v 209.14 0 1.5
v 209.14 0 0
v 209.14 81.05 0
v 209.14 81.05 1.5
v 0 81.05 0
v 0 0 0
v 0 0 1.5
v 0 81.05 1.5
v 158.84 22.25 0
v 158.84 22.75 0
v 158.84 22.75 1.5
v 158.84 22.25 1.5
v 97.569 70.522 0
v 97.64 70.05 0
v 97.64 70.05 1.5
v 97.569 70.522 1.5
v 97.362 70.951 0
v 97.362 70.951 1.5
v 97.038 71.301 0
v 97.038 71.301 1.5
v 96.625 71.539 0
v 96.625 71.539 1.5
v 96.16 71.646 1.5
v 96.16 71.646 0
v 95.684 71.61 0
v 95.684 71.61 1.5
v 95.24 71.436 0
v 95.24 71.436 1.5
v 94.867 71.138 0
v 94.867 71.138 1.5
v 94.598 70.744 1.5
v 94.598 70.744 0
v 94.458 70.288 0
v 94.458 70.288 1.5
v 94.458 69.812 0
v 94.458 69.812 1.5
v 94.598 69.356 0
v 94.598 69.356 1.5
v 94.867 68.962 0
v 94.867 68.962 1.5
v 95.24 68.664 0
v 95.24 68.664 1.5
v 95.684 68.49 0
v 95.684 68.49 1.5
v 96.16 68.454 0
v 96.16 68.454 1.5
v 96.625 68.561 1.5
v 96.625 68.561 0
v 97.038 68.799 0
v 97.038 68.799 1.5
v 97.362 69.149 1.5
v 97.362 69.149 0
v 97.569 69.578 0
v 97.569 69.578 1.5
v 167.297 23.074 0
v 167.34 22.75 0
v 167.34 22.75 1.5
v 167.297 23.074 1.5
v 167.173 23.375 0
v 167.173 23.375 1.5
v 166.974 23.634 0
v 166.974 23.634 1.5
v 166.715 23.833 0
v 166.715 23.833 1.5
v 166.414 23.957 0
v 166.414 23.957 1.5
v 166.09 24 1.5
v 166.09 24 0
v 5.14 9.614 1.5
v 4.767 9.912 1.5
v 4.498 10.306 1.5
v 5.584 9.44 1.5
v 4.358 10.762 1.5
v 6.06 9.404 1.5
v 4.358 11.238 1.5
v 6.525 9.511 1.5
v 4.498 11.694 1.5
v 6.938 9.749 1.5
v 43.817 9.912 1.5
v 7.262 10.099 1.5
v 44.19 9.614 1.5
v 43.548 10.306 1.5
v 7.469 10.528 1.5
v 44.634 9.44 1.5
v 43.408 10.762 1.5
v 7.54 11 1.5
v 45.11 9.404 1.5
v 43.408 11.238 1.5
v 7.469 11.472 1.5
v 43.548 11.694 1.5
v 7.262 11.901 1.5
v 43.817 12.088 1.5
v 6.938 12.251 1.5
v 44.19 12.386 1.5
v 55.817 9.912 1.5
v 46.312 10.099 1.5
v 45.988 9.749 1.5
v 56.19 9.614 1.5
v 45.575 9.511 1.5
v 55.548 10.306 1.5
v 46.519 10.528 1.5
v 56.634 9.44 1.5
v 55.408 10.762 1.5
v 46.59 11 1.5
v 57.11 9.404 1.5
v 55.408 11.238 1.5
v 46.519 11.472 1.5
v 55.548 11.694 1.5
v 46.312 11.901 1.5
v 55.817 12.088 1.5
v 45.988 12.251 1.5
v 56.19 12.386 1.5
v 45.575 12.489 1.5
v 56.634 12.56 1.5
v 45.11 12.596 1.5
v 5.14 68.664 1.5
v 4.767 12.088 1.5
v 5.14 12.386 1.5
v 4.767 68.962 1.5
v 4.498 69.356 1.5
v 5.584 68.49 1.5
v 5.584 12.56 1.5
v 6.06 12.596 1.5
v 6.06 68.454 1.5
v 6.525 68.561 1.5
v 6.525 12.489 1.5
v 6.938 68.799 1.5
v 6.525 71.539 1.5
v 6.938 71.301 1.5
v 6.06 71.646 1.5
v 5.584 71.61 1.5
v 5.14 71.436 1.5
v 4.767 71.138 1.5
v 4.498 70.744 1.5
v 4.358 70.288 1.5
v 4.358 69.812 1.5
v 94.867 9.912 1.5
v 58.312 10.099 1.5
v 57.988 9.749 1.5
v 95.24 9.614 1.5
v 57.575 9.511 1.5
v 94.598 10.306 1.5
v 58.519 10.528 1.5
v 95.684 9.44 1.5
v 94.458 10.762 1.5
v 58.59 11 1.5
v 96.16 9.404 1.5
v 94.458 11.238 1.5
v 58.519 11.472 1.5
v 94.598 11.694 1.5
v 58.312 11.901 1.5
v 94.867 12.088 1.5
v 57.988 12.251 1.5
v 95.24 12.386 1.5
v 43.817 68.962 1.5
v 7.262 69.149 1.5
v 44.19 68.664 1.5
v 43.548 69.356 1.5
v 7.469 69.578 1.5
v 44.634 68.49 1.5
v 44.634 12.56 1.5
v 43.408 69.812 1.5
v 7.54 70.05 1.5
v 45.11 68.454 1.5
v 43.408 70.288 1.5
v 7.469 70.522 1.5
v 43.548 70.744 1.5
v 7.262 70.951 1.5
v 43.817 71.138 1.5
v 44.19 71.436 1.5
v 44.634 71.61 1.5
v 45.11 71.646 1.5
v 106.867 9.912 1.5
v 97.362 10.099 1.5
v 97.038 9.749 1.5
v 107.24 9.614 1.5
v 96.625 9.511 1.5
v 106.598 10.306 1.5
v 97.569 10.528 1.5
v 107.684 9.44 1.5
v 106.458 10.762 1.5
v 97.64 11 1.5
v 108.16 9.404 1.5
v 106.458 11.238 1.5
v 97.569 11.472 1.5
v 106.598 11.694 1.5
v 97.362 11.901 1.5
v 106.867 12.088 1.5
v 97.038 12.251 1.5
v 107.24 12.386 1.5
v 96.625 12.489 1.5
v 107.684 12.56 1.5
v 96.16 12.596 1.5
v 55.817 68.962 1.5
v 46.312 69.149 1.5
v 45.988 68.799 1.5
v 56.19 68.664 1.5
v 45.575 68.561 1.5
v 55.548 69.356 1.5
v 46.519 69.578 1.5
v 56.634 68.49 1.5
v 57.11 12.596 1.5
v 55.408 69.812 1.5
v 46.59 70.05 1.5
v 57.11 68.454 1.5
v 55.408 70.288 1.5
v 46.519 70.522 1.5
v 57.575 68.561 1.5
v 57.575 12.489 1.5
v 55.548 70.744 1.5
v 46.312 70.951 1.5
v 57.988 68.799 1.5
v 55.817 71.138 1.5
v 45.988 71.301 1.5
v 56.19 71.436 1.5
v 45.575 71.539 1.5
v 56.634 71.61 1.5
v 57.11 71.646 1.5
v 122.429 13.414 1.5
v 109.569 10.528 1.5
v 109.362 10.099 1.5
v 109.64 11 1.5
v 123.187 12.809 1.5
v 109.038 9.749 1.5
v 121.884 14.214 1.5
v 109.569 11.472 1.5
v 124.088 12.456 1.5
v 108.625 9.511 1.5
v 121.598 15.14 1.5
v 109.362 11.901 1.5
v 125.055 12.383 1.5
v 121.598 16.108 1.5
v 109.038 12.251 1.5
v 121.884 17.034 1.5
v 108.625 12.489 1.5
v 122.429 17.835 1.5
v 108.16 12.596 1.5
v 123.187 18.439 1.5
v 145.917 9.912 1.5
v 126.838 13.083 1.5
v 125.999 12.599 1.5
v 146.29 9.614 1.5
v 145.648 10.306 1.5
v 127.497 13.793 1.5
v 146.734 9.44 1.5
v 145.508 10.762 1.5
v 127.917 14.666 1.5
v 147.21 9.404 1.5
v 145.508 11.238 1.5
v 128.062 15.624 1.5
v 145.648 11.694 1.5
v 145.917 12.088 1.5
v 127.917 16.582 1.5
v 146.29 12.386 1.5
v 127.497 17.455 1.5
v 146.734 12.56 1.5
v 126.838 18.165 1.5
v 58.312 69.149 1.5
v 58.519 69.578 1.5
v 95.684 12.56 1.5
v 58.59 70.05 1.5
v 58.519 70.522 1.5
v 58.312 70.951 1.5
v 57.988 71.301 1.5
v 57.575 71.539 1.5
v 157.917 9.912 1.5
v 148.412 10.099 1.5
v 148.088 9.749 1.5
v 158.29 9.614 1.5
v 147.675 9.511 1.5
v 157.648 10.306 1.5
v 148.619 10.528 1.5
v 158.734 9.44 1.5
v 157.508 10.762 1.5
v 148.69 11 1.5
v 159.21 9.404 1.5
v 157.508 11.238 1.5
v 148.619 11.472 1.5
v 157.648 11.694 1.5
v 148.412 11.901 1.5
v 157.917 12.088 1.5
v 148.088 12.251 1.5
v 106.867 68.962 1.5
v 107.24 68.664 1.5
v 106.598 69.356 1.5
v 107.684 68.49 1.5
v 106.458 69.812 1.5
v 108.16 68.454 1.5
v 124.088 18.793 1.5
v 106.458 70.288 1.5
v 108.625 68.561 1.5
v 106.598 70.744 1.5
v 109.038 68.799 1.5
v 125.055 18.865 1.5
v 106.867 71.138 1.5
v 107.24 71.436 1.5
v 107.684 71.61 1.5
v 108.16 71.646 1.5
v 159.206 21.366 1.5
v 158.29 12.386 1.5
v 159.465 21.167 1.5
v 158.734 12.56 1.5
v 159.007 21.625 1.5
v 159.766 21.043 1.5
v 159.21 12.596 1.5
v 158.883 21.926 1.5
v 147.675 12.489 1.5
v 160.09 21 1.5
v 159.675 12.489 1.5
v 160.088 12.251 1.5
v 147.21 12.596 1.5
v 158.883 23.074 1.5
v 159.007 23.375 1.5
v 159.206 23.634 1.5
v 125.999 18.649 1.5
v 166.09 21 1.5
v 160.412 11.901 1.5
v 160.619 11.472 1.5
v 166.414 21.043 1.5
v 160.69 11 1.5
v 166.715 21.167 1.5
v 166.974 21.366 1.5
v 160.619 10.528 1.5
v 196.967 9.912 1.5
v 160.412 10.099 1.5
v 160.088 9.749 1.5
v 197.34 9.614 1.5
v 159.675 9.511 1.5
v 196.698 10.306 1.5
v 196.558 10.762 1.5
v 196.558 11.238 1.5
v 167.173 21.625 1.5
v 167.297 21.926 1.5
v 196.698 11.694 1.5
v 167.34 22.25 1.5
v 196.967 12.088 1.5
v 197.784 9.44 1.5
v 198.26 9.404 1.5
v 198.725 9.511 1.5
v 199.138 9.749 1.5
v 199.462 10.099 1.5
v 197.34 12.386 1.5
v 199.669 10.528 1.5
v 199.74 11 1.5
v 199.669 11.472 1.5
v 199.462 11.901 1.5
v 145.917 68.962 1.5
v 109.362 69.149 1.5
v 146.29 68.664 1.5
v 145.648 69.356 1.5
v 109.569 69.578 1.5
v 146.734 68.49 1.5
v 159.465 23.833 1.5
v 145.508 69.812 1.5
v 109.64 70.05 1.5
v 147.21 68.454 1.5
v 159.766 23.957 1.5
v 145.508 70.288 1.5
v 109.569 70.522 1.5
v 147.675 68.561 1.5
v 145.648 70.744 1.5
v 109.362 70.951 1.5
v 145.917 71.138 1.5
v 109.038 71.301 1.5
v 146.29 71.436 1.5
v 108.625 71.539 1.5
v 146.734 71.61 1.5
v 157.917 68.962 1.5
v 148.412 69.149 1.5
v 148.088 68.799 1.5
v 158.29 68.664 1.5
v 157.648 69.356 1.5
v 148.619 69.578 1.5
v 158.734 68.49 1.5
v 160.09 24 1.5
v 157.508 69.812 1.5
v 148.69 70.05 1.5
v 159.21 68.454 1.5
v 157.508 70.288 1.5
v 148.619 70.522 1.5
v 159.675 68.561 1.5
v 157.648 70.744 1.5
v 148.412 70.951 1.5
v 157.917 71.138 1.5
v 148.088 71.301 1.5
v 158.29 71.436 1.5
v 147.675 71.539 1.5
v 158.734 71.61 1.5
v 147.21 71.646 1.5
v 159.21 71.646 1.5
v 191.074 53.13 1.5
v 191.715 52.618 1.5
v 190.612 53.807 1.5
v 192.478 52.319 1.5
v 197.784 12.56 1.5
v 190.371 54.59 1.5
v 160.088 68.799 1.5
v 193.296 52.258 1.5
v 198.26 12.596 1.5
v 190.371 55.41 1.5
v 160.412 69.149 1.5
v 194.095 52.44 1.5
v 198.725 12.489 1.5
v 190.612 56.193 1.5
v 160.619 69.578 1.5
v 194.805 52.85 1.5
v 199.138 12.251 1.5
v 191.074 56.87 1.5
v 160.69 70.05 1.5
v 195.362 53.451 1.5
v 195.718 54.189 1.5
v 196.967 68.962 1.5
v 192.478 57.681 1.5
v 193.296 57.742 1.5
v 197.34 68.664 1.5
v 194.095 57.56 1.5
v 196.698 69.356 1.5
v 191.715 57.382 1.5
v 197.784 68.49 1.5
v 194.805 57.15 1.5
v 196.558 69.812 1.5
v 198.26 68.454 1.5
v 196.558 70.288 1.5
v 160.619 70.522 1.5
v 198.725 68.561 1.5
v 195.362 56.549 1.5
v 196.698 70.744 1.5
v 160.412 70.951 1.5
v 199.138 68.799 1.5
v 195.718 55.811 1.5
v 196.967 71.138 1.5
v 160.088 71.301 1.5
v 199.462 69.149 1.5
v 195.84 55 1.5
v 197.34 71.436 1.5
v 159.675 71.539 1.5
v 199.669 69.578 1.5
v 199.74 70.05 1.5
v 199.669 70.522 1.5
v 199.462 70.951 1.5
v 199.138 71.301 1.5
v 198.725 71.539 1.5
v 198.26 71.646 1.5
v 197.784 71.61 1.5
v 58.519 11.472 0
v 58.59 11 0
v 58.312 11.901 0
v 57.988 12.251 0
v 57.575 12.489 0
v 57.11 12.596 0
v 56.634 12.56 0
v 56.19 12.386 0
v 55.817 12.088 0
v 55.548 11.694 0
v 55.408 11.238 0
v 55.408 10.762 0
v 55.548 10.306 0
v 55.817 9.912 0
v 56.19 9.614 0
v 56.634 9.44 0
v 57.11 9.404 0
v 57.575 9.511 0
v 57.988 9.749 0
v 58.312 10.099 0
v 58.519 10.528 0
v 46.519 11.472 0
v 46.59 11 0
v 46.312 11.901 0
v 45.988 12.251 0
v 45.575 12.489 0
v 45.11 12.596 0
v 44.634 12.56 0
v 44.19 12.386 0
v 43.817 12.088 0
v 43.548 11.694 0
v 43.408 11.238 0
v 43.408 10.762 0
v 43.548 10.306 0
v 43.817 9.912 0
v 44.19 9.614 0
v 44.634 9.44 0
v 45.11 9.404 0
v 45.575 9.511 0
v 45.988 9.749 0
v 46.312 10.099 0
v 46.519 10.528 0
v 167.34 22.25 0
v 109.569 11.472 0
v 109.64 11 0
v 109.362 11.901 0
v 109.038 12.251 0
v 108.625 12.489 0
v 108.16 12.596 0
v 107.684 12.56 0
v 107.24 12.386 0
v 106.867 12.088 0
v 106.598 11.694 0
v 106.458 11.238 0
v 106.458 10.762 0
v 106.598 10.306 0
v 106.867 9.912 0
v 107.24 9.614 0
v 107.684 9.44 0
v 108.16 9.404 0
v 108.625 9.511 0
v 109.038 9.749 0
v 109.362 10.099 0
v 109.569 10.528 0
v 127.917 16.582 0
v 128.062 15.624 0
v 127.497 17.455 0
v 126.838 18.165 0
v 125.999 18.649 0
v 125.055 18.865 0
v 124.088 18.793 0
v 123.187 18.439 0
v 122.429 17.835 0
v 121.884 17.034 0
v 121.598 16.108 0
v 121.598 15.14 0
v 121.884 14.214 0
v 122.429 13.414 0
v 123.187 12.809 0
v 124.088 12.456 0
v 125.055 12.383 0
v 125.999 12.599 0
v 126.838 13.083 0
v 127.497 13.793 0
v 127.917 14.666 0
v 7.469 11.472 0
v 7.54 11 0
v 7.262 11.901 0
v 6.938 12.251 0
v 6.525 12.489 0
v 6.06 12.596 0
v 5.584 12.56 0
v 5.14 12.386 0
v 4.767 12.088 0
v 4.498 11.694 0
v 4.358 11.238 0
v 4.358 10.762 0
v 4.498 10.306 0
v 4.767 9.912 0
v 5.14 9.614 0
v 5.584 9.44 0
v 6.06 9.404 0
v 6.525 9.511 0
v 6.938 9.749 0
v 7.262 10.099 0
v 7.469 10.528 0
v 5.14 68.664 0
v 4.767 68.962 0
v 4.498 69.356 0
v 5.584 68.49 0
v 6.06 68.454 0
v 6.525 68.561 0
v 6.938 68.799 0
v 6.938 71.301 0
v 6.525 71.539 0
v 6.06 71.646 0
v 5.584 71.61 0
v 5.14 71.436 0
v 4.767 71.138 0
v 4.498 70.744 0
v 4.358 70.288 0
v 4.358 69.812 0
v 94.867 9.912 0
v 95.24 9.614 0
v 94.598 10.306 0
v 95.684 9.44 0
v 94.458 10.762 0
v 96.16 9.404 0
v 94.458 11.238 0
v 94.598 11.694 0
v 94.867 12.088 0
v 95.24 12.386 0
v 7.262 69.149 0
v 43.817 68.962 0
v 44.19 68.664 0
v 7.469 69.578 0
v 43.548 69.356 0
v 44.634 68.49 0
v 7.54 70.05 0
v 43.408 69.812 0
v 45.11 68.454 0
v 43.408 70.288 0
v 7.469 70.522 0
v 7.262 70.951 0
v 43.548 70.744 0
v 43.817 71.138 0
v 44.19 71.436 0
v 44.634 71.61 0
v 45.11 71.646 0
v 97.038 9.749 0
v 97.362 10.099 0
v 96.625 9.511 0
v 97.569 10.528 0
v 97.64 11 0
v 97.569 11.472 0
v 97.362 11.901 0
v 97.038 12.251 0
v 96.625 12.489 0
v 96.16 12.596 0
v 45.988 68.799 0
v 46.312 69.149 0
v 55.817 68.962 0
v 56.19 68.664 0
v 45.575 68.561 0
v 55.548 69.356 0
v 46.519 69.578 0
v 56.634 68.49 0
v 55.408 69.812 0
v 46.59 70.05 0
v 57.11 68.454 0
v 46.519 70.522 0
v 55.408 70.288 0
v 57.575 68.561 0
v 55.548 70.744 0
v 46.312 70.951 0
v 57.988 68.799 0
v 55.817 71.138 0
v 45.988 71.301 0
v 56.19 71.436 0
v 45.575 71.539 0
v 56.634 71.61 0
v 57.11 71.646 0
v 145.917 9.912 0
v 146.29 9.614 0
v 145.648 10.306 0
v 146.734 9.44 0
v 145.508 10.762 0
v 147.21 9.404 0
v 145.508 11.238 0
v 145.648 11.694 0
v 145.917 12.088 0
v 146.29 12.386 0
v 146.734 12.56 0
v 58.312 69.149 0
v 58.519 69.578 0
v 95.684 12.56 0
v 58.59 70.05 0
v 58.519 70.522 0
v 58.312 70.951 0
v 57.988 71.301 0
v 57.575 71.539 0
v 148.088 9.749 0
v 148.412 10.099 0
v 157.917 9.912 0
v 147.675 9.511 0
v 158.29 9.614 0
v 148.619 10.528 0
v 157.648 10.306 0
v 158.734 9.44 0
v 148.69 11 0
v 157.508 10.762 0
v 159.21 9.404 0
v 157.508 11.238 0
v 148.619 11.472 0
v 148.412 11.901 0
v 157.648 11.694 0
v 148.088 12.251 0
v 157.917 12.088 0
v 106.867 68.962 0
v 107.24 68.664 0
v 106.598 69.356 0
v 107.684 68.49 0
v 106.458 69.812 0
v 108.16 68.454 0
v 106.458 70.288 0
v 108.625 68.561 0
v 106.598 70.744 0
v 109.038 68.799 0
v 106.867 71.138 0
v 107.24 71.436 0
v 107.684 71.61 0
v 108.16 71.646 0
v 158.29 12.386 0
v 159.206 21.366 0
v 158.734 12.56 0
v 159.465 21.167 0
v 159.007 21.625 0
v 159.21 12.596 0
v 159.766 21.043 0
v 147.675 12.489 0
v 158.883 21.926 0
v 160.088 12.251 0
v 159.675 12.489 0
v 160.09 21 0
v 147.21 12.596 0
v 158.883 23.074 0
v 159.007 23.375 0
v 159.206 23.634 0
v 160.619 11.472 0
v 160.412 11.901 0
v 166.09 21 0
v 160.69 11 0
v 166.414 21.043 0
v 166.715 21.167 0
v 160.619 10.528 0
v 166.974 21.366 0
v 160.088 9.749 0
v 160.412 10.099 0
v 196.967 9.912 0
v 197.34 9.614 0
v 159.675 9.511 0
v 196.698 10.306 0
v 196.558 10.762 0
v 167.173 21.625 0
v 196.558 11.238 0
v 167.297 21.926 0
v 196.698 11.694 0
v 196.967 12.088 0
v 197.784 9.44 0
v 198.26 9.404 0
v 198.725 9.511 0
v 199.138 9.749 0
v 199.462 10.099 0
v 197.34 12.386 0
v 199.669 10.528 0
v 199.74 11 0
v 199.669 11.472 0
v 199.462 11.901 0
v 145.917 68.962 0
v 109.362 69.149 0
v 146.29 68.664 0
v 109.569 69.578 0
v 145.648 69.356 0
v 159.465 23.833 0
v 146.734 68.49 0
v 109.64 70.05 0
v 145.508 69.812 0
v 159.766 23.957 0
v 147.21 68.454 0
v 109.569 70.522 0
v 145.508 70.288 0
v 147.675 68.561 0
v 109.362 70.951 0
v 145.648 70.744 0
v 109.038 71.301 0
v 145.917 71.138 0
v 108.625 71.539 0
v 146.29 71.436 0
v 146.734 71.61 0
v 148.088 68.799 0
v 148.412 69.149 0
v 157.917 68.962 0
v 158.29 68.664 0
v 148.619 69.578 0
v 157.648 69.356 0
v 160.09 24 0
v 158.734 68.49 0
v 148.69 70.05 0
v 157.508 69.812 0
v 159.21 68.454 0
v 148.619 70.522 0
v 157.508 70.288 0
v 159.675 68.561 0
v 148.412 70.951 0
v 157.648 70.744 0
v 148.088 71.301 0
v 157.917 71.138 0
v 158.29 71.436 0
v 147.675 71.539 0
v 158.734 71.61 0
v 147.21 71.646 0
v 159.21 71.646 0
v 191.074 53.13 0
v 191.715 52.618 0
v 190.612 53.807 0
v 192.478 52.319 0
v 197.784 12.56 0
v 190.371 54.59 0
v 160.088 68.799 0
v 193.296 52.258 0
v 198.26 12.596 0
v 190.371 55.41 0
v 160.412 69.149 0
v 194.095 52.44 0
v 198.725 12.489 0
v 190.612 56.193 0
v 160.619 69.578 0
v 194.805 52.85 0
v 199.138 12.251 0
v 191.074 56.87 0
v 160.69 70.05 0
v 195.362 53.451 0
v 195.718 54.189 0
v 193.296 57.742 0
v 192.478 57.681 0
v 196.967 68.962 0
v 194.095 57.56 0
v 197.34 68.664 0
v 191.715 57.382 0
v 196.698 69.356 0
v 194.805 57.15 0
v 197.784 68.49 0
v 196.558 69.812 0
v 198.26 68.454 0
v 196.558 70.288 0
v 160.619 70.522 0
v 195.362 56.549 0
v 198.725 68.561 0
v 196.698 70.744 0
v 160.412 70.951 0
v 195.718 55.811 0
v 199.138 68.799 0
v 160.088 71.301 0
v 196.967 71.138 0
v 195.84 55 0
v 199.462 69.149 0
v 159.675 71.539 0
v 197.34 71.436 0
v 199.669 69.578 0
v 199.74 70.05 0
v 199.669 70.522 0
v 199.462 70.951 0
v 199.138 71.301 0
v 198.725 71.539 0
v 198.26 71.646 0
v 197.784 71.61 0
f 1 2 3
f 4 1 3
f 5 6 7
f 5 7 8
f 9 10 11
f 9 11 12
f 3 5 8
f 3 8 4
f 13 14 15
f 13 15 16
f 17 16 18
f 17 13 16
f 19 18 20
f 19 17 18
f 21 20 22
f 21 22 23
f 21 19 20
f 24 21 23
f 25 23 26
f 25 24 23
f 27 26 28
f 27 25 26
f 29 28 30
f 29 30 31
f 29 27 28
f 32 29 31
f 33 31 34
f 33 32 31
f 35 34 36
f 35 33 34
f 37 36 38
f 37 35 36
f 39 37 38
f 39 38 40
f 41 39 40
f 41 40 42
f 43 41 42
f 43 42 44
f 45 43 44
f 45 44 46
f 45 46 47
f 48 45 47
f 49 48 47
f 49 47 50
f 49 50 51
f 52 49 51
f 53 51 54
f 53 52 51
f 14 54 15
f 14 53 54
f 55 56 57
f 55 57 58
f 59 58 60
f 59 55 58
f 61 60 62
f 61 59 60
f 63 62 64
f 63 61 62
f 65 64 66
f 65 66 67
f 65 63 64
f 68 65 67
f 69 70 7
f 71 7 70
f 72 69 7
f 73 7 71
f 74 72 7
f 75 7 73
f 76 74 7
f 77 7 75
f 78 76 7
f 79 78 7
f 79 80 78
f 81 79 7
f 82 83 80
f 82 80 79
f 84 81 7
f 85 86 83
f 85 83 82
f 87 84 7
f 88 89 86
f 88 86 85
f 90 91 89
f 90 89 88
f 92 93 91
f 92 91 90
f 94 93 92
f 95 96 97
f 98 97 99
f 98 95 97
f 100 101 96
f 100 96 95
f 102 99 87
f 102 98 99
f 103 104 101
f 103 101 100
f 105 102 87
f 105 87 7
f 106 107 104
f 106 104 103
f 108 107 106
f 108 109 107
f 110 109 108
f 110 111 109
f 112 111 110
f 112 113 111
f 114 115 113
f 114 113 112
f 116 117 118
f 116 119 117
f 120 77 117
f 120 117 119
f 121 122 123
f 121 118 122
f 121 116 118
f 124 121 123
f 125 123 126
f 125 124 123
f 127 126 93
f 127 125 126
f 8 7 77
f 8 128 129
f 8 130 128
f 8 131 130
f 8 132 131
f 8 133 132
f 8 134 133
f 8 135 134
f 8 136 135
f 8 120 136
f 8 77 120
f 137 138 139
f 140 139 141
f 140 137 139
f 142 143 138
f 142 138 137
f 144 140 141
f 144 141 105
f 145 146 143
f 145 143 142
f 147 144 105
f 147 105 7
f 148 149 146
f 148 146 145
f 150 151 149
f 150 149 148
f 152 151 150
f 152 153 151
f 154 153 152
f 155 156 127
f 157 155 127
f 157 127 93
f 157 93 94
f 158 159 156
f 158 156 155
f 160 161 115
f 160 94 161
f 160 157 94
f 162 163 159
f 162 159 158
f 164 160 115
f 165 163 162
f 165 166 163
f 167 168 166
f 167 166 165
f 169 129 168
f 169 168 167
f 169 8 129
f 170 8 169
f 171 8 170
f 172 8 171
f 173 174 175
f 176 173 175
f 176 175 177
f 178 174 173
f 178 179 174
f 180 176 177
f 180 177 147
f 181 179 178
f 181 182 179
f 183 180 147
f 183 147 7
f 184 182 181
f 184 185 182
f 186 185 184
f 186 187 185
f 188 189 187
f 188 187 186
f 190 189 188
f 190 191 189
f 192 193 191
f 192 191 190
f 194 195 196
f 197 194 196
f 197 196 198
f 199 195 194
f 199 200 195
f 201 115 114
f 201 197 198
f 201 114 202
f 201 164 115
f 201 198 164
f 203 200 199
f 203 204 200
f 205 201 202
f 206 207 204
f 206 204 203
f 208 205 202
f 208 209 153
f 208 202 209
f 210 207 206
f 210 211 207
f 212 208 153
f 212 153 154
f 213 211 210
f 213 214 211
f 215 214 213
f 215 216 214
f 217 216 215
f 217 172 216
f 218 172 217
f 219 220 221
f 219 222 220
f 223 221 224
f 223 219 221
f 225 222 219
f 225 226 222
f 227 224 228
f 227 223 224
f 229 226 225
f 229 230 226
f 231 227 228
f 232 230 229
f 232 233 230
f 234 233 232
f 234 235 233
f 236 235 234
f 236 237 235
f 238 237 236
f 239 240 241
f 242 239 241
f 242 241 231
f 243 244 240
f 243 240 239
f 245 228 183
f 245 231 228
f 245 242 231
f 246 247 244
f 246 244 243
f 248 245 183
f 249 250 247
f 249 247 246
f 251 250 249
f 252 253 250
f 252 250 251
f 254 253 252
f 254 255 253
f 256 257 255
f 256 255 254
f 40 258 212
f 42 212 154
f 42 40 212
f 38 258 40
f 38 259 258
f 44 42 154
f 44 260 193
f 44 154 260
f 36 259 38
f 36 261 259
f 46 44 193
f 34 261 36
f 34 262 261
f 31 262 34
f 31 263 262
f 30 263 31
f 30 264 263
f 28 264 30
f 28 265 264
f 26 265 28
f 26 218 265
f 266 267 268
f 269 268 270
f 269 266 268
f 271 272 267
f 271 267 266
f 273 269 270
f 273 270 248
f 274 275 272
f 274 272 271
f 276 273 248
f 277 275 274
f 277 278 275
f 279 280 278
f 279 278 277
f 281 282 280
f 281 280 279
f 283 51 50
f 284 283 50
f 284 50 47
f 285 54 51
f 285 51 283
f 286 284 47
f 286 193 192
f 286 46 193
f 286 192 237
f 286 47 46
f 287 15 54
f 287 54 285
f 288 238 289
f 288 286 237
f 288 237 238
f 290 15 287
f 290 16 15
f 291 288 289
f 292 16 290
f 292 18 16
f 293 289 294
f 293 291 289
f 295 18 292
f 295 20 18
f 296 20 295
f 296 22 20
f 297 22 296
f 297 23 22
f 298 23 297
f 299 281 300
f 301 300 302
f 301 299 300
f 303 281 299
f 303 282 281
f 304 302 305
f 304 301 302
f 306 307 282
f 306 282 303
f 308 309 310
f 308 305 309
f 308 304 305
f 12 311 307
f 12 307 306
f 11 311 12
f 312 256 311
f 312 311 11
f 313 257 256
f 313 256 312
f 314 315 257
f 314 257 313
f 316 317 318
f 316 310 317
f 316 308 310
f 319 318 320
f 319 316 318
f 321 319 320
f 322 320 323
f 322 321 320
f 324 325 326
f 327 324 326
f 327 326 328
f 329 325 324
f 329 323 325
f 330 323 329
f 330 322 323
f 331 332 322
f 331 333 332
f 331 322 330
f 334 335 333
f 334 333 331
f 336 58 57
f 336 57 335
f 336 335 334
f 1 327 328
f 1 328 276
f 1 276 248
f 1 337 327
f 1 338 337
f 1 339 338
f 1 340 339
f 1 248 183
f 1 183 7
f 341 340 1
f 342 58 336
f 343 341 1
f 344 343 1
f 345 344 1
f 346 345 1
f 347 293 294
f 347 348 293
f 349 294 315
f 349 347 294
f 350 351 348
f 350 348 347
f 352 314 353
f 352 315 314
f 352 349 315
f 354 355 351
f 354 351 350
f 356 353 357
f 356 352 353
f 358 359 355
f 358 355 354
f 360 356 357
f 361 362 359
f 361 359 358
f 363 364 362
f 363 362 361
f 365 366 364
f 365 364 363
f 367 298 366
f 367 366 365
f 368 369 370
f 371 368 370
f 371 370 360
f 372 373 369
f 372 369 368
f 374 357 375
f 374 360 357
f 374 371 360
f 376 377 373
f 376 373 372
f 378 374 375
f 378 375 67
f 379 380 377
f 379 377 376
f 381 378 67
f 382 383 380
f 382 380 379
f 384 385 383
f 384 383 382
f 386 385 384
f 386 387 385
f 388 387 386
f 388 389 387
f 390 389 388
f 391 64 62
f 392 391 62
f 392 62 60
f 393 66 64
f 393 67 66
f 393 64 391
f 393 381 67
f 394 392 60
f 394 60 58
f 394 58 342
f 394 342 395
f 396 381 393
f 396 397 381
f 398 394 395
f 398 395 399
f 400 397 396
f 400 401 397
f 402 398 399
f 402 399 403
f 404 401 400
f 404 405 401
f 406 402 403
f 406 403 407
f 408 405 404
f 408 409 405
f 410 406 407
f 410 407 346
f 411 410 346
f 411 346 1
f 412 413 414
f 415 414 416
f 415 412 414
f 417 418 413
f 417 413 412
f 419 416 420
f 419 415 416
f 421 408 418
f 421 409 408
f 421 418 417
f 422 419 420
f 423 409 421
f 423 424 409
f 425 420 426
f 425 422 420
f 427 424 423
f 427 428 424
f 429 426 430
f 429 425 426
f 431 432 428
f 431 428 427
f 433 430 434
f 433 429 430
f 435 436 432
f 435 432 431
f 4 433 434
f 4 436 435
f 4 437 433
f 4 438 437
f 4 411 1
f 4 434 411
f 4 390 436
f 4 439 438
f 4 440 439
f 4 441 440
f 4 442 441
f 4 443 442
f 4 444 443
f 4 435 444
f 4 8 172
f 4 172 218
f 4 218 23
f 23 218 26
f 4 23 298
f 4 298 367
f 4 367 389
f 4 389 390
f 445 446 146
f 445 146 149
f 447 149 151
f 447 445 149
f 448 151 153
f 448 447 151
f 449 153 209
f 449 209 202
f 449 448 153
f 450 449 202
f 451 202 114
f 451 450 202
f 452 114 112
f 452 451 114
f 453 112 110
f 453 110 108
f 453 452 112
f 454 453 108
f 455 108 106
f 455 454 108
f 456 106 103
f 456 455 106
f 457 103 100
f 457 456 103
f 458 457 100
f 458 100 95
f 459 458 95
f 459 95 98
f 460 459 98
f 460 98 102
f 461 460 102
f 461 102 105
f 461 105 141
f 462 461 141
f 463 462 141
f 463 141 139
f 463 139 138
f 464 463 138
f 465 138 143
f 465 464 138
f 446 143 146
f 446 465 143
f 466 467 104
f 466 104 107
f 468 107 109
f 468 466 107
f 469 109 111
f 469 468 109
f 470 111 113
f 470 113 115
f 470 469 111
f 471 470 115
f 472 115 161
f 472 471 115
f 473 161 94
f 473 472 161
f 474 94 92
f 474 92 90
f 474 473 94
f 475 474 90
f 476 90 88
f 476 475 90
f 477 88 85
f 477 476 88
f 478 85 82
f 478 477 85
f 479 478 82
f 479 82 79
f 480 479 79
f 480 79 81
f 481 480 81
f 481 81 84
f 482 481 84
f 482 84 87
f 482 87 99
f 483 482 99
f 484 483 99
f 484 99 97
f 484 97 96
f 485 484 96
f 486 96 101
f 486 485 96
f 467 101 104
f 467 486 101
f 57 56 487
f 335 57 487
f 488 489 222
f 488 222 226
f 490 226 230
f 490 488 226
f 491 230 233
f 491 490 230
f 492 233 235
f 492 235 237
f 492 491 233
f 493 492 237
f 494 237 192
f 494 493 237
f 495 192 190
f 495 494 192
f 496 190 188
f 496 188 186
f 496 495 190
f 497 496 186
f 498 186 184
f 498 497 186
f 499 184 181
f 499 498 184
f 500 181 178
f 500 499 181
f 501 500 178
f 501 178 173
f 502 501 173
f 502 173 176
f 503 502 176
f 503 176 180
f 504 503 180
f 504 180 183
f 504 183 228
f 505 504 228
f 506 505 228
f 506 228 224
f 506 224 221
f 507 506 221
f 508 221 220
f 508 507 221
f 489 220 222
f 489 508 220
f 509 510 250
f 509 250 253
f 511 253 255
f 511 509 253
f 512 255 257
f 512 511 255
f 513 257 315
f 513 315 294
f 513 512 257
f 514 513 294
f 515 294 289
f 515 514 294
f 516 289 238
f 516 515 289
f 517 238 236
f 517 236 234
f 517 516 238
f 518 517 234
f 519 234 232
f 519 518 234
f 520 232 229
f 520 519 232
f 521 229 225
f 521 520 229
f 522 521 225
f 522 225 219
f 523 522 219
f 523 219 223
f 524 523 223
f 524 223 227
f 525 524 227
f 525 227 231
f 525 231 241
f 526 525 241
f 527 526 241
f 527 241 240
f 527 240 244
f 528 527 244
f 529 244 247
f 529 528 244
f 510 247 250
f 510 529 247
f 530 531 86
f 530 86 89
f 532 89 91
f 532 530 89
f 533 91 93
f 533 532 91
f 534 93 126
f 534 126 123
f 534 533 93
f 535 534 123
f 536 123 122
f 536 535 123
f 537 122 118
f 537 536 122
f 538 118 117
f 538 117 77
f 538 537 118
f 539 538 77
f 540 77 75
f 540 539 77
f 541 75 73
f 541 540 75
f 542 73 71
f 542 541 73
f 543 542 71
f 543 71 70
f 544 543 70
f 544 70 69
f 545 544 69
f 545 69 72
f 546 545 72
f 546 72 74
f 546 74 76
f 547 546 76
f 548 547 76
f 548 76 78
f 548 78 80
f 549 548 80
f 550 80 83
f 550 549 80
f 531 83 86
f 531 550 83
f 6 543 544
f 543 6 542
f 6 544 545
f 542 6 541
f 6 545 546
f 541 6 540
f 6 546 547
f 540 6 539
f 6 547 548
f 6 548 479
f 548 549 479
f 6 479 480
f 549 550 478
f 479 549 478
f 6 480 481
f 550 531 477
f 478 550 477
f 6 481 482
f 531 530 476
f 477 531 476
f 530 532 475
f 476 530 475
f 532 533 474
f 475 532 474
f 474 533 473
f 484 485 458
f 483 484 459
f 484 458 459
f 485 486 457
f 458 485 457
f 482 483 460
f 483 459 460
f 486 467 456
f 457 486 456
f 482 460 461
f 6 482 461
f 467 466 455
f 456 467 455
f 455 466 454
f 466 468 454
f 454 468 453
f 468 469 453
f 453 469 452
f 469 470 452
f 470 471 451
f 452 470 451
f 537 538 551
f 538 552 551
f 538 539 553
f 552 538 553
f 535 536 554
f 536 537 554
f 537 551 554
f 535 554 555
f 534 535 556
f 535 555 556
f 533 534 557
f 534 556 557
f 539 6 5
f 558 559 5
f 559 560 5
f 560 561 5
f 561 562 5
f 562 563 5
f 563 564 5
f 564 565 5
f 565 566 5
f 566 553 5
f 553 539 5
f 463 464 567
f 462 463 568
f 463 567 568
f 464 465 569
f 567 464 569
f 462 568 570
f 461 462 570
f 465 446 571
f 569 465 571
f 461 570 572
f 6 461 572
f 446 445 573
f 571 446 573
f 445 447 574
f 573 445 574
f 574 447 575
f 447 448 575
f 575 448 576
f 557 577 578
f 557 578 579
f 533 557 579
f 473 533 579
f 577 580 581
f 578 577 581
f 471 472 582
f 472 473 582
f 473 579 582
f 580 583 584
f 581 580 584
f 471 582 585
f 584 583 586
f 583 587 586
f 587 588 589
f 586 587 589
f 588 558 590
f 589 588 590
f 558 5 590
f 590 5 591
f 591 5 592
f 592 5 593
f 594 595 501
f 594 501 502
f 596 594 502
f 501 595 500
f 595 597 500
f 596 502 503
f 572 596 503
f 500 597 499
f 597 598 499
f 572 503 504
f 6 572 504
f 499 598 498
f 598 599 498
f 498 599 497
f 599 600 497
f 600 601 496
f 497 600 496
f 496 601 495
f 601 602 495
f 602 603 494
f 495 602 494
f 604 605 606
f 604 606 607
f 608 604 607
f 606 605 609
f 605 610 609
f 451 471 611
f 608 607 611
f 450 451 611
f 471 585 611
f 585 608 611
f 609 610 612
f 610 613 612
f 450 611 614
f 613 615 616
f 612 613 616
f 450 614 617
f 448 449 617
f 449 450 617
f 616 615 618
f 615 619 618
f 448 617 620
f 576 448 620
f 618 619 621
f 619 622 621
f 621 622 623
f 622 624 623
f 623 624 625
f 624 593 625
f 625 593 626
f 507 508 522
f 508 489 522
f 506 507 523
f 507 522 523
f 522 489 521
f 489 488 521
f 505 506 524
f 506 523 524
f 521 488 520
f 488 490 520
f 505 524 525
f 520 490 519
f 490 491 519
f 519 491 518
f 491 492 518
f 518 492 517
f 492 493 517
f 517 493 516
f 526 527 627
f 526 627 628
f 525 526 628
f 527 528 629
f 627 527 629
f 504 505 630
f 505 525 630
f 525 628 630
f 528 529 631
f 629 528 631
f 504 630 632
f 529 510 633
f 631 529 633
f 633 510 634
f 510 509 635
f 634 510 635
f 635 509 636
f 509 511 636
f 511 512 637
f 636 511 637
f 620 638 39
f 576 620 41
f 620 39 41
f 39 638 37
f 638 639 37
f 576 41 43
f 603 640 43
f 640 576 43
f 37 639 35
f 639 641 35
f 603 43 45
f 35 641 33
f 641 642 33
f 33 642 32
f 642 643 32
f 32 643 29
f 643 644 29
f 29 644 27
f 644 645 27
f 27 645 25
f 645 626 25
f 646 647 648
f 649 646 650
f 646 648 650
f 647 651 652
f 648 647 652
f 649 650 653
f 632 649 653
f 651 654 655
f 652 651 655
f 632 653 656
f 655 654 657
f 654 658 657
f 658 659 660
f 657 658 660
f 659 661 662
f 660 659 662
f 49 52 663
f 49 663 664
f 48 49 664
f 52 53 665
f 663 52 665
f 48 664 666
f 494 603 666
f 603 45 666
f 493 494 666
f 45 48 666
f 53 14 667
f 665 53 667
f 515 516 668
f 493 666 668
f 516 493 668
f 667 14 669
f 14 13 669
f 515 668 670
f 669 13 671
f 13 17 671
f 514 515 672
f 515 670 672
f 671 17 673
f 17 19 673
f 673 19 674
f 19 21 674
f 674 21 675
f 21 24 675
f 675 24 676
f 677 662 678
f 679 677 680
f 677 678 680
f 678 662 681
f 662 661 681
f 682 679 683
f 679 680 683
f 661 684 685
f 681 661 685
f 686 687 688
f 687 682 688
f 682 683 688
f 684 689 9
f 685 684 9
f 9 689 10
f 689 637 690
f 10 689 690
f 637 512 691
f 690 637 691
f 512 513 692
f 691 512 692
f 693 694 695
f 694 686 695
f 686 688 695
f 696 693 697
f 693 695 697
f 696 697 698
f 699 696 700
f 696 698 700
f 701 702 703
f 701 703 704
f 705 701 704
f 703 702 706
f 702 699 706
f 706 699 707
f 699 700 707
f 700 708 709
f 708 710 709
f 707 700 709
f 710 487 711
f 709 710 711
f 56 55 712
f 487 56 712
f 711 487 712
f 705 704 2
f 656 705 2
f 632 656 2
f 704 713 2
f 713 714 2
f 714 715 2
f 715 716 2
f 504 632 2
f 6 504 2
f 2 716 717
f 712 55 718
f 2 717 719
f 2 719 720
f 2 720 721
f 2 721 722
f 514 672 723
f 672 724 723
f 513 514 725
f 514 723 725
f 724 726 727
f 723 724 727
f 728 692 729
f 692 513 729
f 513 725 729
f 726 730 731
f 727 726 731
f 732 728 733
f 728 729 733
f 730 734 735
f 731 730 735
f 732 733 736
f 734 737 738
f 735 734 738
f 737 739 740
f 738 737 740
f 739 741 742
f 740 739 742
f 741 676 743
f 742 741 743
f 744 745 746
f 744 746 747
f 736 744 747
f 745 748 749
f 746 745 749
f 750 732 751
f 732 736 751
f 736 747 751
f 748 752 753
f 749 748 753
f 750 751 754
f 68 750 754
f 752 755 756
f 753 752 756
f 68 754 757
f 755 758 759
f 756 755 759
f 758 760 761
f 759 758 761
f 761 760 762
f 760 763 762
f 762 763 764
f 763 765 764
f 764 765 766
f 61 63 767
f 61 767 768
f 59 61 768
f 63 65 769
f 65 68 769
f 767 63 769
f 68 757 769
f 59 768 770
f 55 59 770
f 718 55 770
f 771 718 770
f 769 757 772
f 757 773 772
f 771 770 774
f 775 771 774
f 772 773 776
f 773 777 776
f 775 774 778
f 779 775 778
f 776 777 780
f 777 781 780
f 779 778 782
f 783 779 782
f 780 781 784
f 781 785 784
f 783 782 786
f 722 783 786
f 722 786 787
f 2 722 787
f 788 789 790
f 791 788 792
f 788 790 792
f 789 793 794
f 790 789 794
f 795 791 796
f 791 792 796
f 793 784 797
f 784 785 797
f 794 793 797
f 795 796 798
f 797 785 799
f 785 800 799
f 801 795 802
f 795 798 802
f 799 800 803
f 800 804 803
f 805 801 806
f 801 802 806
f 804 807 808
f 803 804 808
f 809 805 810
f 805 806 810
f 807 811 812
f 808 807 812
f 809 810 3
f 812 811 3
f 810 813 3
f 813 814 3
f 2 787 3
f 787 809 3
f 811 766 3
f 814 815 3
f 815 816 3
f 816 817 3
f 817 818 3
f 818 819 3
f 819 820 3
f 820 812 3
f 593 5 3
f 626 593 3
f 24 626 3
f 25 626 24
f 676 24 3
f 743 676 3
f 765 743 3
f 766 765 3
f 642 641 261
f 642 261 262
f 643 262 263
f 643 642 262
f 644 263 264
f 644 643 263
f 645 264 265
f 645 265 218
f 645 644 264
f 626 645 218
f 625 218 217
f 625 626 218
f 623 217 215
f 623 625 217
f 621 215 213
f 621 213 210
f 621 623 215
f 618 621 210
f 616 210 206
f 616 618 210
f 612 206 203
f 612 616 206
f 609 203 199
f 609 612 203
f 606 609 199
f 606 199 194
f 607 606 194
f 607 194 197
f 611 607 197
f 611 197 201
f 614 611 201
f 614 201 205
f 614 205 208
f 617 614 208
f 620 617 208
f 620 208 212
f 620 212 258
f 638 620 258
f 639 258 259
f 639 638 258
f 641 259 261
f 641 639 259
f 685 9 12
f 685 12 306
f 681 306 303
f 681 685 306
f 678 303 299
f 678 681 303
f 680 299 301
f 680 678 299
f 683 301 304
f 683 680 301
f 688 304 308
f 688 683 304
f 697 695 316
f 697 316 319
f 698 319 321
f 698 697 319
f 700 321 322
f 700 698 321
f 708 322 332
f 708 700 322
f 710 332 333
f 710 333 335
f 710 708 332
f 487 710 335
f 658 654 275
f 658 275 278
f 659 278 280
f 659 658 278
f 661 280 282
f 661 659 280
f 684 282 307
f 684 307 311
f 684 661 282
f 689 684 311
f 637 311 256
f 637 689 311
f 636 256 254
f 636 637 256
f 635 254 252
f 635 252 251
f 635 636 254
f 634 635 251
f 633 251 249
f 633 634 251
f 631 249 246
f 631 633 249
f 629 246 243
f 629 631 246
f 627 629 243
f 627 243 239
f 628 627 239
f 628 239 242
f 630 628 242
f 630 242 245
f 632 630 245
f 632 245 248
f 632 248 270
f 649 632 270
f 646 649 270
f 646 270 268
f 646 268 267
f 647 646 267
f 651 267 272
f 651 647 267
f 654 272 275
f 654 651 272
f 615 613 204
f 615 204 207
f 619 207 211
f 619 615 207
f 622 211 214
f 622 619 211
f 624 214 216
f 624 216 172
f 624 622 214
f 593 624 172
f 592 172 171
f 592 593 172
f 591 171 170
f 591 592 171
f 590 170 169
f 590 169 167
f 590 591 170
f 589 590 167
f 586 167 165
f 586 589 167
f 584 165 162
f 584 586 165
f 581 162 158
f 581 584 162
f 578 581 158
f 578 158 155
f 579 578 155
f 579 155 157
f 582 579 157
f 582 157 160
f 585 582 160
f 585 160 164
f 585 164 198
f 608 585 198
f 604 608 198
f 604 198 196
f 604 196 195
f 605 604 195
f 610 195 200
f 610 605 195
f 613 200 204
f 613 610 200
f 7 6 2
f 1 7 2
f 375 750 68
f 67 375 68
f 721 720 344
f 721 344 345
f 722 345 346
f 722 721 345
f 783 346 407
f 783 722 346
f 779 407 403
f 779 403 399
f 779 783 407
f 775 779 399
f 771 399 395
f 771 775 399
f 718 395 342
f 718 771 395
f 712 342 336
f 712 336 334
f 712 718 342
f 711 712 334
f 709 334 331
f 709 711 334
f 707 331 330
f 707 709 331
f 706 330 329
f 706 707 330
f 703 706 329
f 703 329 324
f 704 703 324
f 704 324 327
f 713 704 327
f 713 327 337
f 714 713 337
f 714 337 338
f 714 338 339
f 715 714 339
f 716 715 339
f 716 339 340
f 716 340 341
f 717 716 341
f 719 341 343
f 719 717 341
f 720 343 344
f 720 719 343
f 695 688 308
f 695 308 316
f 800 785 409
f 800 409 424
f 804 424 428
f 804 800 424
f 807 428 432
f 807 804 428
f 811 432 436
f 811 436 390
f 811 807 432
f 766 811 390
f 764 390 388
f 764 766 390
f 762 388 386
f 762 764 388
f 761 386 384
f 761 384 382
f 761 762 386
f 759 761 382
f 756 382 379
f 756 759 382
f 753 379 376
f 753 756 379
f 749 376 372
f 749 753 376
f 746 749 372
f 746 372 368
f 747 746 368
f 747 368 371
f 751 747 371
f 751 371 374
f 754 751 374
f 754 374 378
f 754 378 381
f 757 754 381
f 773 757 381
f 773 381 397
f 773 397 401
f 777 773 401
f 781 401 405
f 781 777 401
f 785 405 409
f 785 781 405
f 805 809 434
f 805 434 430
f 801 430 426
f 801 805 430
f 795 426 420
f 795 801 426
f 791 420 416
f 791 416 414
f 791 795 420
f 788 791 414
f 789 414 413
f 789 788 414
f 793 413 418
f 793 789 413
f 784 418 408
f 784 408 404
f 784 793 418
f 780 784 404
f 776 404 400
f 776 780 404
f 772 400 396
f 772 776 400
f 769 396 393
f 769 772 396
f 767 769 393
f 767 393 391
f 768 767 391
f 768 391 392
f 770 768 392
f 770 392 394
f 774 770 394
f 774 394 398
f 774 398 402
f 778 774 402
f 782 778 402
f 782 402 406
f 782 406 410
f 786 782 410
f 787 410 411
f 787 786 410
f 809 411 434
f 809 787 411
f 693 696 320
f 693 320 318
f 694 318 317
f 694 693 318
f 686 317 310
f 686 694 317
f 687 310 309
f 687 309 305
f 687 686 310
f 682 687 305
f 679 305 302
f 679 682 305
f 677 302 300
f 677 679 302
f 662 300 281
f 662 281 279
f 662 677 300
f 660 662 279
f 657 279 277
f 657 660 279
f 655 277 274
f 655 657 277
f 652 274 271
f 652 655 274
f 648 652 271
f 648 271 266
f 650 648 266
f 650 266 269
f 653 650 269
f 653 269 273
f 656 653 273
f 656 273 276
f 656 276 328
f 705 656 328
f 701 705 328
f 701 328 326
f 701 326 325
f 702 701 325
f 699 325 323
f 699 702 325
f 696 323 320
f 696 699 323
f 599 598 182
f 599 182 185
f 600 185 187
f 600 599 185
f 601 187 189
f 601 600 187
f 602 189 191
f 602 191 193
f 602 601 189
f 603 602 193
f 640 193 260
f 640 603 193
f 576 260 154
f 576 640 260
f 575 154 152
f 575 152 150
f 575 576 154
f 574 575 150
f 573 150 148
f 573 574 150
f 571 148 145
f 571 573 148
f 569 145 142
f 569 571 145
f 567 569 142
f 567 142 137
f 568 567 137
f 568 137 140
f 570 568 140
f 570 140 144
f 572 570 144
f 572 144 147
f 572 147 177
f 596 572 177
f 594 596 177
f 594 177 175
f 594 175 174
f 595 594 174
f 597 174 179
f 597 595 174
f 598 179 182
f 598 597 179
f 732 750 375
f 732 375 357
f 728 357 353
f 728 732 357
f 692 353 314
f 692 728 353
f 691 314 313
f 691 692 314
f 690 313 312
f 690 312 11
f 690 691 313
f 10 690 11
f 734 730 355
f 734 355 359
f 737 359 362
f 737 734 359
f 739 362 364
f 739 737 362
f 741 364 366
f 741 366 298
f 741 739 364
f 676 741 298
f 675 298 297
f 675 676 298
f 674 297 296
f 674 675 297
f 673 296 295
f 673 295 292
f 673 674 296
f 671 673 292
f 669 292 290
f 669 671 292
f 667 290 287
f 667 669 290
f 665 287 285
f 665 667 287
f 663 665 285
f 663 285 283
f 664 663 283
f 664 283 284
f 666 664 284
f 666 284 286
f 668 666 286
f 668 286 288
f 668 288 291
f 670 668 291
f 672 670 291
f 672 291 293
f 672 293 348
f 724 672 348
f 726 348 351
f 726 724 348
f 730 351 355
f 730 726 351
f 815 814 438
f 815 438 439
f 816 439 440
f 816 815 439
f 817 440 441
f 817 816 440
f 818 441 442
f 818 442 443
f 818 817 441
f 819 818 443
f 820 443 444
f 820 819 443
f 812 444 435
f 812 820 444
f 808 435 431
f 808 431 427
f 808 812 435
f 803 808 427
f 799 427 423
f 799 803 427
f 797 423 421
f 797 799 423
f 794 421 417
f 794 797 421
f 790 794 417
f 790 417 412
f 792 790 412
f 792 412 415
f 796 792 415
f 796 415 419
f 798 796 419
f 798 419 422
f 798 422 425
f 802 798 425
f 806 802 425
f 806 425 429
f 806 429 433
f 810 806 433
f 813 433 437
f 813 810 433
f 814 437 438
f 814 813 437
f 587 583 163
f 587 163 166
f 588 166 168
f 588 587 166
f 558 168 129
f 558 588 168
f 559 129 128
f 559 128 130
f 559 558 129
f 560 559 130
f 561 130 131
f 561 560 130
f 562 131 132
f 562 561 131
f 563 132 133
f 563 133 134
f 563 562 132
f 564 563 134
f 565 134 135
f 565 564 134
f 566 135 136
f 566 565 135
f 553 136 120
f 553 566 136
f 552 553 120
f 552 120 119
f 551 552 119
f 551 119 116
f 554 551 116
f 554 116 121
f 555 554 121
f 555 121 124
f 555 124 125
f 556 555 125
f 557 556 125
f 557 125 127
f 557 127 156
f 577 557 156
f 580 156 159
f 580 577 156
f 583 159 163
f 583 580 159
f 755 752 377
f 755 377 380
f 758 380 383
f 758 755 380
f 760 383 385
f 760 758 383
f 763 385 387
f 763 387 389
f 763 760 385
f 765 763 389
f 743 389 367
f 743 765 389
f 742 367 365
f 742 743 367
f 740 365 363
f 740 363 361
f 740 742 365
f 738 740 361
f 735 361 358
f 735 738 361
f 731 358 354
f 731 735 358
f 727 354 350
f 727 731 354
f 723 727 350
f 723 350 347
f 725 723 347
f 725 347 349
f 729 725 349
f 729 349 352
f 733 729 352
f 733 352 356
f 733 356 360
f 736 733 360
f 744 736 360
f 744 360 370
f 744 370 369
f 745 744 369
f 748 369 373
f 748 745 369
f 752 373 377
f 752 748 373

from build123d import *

# Parameters (mm, degrees)
SKETCH_W   = 209.14
SKETCH_H   = 81.05
SKETCH_R   = 1.6
SKETCH_R_2 = 2.75
SKETCH_R_3 = 3.25
PAD_DEPTH  = 1.5


with BuildPart() as part:
    # Sketch → Pad (new body)
    with BuildSketch(Plane.XY):
        with Locations((104.57, 40.525)):
            Rectangle(SKETCH_W, SKETCH_H)
        with Locations((5.94, 70.05)):
            Circle(SKETCH_R, mode=Mode.SUBTRACT)
        with Locations((44.99, 70.05)):
            Circle(SKETCH_R, mode=Mode.SUBTRACT)
        with Locations((56.99, 70.05)):
            Circle(SKETCH_R, mode=Mode.SUBTRACT)
        with Locations((96.04, 70.05)):
            Circle(SKETCH_R, mode=Mode.SUBTRACT)
        with Locations((108.04, 70.05)):
            Circle(SKETCH_R, mode=Mode.SUBTRACT)
        with Locations((147.09, 70.05)):
            Circle(SKETCH_R, mode=Mode.SUBTRACT)
        with Locations((159.09, 70.05)):
            Circle(SKETCH_R, mode=Mode.SUBTRACT)
        with Locations((198.14, 70.05)):
            Circle(SKETCH_R, mode=Mode.SUBTRACT)
        with Locations((198.14, 11)):
            Circle(SKETCH_R, mode=Mode.SUBTRACT)
        with Locations((159.09, 11)):
            Circle(SKETCH_R, mode=Mode.SUBTRACT)
        with Locations((147.09, 11)):
            Circle(SKETCH_R, mode=Mode.SUBTRACT)
        with Locations((108.04, 11)):
            Circle(SKETCH_R, mode=Mode.SUBTRACT)
        with Locations((96.04, 11)):
            Circle(SKETCH_R, mode=Mode.SUBTRACT)
        with Locations((56.99, 11)):
            Circle(SKETCH_R, mode=Mode.SUBTRACT)
        with Locations((44.99, 11)):
            Circle(SKETCH_R, mode=Mode.SUBTRACT)
        with Locations((5.94, 11)):
            Circle(SKETCH_R, mode=Mode.SUBTRACT)
        with Locations((193.09, 55)):
            Circle(SKETCH_R_2, mode=Mode.SUBTRACT)
        with Locations((124.811676, 15.624069)):
            Circle(SKETCH_R_3, mode=Mode.SUBTRACT)
        with BuildLine():
            Line((160.09, 21), (166.09, 21))
            ThreePointArc((166.09, 21), (166.973883, 21.366117), (167.34, 22.25))
            Line((167.34, 22.75), (167.34, 22.25))
            ThreePointArc((167.34, 22.75), (166.973883, 23.633883), (166.09, 24))
            Line((160.09, 24), (166.09, 24))
            ThreePointArc((160.09, 24), (159.206117, 23.633883), (158.84, 22.75))
            Line((158.84, 22.75), (158.84, 22.250002))
            ThreePointArc((158.84, 22.250002), (159.206116, 21.366117), (160.09, 21))
        make_face(mode=Mode.SUBTRACT)
    extrude(amount=PAD_DEPTH)


solid = part.part
